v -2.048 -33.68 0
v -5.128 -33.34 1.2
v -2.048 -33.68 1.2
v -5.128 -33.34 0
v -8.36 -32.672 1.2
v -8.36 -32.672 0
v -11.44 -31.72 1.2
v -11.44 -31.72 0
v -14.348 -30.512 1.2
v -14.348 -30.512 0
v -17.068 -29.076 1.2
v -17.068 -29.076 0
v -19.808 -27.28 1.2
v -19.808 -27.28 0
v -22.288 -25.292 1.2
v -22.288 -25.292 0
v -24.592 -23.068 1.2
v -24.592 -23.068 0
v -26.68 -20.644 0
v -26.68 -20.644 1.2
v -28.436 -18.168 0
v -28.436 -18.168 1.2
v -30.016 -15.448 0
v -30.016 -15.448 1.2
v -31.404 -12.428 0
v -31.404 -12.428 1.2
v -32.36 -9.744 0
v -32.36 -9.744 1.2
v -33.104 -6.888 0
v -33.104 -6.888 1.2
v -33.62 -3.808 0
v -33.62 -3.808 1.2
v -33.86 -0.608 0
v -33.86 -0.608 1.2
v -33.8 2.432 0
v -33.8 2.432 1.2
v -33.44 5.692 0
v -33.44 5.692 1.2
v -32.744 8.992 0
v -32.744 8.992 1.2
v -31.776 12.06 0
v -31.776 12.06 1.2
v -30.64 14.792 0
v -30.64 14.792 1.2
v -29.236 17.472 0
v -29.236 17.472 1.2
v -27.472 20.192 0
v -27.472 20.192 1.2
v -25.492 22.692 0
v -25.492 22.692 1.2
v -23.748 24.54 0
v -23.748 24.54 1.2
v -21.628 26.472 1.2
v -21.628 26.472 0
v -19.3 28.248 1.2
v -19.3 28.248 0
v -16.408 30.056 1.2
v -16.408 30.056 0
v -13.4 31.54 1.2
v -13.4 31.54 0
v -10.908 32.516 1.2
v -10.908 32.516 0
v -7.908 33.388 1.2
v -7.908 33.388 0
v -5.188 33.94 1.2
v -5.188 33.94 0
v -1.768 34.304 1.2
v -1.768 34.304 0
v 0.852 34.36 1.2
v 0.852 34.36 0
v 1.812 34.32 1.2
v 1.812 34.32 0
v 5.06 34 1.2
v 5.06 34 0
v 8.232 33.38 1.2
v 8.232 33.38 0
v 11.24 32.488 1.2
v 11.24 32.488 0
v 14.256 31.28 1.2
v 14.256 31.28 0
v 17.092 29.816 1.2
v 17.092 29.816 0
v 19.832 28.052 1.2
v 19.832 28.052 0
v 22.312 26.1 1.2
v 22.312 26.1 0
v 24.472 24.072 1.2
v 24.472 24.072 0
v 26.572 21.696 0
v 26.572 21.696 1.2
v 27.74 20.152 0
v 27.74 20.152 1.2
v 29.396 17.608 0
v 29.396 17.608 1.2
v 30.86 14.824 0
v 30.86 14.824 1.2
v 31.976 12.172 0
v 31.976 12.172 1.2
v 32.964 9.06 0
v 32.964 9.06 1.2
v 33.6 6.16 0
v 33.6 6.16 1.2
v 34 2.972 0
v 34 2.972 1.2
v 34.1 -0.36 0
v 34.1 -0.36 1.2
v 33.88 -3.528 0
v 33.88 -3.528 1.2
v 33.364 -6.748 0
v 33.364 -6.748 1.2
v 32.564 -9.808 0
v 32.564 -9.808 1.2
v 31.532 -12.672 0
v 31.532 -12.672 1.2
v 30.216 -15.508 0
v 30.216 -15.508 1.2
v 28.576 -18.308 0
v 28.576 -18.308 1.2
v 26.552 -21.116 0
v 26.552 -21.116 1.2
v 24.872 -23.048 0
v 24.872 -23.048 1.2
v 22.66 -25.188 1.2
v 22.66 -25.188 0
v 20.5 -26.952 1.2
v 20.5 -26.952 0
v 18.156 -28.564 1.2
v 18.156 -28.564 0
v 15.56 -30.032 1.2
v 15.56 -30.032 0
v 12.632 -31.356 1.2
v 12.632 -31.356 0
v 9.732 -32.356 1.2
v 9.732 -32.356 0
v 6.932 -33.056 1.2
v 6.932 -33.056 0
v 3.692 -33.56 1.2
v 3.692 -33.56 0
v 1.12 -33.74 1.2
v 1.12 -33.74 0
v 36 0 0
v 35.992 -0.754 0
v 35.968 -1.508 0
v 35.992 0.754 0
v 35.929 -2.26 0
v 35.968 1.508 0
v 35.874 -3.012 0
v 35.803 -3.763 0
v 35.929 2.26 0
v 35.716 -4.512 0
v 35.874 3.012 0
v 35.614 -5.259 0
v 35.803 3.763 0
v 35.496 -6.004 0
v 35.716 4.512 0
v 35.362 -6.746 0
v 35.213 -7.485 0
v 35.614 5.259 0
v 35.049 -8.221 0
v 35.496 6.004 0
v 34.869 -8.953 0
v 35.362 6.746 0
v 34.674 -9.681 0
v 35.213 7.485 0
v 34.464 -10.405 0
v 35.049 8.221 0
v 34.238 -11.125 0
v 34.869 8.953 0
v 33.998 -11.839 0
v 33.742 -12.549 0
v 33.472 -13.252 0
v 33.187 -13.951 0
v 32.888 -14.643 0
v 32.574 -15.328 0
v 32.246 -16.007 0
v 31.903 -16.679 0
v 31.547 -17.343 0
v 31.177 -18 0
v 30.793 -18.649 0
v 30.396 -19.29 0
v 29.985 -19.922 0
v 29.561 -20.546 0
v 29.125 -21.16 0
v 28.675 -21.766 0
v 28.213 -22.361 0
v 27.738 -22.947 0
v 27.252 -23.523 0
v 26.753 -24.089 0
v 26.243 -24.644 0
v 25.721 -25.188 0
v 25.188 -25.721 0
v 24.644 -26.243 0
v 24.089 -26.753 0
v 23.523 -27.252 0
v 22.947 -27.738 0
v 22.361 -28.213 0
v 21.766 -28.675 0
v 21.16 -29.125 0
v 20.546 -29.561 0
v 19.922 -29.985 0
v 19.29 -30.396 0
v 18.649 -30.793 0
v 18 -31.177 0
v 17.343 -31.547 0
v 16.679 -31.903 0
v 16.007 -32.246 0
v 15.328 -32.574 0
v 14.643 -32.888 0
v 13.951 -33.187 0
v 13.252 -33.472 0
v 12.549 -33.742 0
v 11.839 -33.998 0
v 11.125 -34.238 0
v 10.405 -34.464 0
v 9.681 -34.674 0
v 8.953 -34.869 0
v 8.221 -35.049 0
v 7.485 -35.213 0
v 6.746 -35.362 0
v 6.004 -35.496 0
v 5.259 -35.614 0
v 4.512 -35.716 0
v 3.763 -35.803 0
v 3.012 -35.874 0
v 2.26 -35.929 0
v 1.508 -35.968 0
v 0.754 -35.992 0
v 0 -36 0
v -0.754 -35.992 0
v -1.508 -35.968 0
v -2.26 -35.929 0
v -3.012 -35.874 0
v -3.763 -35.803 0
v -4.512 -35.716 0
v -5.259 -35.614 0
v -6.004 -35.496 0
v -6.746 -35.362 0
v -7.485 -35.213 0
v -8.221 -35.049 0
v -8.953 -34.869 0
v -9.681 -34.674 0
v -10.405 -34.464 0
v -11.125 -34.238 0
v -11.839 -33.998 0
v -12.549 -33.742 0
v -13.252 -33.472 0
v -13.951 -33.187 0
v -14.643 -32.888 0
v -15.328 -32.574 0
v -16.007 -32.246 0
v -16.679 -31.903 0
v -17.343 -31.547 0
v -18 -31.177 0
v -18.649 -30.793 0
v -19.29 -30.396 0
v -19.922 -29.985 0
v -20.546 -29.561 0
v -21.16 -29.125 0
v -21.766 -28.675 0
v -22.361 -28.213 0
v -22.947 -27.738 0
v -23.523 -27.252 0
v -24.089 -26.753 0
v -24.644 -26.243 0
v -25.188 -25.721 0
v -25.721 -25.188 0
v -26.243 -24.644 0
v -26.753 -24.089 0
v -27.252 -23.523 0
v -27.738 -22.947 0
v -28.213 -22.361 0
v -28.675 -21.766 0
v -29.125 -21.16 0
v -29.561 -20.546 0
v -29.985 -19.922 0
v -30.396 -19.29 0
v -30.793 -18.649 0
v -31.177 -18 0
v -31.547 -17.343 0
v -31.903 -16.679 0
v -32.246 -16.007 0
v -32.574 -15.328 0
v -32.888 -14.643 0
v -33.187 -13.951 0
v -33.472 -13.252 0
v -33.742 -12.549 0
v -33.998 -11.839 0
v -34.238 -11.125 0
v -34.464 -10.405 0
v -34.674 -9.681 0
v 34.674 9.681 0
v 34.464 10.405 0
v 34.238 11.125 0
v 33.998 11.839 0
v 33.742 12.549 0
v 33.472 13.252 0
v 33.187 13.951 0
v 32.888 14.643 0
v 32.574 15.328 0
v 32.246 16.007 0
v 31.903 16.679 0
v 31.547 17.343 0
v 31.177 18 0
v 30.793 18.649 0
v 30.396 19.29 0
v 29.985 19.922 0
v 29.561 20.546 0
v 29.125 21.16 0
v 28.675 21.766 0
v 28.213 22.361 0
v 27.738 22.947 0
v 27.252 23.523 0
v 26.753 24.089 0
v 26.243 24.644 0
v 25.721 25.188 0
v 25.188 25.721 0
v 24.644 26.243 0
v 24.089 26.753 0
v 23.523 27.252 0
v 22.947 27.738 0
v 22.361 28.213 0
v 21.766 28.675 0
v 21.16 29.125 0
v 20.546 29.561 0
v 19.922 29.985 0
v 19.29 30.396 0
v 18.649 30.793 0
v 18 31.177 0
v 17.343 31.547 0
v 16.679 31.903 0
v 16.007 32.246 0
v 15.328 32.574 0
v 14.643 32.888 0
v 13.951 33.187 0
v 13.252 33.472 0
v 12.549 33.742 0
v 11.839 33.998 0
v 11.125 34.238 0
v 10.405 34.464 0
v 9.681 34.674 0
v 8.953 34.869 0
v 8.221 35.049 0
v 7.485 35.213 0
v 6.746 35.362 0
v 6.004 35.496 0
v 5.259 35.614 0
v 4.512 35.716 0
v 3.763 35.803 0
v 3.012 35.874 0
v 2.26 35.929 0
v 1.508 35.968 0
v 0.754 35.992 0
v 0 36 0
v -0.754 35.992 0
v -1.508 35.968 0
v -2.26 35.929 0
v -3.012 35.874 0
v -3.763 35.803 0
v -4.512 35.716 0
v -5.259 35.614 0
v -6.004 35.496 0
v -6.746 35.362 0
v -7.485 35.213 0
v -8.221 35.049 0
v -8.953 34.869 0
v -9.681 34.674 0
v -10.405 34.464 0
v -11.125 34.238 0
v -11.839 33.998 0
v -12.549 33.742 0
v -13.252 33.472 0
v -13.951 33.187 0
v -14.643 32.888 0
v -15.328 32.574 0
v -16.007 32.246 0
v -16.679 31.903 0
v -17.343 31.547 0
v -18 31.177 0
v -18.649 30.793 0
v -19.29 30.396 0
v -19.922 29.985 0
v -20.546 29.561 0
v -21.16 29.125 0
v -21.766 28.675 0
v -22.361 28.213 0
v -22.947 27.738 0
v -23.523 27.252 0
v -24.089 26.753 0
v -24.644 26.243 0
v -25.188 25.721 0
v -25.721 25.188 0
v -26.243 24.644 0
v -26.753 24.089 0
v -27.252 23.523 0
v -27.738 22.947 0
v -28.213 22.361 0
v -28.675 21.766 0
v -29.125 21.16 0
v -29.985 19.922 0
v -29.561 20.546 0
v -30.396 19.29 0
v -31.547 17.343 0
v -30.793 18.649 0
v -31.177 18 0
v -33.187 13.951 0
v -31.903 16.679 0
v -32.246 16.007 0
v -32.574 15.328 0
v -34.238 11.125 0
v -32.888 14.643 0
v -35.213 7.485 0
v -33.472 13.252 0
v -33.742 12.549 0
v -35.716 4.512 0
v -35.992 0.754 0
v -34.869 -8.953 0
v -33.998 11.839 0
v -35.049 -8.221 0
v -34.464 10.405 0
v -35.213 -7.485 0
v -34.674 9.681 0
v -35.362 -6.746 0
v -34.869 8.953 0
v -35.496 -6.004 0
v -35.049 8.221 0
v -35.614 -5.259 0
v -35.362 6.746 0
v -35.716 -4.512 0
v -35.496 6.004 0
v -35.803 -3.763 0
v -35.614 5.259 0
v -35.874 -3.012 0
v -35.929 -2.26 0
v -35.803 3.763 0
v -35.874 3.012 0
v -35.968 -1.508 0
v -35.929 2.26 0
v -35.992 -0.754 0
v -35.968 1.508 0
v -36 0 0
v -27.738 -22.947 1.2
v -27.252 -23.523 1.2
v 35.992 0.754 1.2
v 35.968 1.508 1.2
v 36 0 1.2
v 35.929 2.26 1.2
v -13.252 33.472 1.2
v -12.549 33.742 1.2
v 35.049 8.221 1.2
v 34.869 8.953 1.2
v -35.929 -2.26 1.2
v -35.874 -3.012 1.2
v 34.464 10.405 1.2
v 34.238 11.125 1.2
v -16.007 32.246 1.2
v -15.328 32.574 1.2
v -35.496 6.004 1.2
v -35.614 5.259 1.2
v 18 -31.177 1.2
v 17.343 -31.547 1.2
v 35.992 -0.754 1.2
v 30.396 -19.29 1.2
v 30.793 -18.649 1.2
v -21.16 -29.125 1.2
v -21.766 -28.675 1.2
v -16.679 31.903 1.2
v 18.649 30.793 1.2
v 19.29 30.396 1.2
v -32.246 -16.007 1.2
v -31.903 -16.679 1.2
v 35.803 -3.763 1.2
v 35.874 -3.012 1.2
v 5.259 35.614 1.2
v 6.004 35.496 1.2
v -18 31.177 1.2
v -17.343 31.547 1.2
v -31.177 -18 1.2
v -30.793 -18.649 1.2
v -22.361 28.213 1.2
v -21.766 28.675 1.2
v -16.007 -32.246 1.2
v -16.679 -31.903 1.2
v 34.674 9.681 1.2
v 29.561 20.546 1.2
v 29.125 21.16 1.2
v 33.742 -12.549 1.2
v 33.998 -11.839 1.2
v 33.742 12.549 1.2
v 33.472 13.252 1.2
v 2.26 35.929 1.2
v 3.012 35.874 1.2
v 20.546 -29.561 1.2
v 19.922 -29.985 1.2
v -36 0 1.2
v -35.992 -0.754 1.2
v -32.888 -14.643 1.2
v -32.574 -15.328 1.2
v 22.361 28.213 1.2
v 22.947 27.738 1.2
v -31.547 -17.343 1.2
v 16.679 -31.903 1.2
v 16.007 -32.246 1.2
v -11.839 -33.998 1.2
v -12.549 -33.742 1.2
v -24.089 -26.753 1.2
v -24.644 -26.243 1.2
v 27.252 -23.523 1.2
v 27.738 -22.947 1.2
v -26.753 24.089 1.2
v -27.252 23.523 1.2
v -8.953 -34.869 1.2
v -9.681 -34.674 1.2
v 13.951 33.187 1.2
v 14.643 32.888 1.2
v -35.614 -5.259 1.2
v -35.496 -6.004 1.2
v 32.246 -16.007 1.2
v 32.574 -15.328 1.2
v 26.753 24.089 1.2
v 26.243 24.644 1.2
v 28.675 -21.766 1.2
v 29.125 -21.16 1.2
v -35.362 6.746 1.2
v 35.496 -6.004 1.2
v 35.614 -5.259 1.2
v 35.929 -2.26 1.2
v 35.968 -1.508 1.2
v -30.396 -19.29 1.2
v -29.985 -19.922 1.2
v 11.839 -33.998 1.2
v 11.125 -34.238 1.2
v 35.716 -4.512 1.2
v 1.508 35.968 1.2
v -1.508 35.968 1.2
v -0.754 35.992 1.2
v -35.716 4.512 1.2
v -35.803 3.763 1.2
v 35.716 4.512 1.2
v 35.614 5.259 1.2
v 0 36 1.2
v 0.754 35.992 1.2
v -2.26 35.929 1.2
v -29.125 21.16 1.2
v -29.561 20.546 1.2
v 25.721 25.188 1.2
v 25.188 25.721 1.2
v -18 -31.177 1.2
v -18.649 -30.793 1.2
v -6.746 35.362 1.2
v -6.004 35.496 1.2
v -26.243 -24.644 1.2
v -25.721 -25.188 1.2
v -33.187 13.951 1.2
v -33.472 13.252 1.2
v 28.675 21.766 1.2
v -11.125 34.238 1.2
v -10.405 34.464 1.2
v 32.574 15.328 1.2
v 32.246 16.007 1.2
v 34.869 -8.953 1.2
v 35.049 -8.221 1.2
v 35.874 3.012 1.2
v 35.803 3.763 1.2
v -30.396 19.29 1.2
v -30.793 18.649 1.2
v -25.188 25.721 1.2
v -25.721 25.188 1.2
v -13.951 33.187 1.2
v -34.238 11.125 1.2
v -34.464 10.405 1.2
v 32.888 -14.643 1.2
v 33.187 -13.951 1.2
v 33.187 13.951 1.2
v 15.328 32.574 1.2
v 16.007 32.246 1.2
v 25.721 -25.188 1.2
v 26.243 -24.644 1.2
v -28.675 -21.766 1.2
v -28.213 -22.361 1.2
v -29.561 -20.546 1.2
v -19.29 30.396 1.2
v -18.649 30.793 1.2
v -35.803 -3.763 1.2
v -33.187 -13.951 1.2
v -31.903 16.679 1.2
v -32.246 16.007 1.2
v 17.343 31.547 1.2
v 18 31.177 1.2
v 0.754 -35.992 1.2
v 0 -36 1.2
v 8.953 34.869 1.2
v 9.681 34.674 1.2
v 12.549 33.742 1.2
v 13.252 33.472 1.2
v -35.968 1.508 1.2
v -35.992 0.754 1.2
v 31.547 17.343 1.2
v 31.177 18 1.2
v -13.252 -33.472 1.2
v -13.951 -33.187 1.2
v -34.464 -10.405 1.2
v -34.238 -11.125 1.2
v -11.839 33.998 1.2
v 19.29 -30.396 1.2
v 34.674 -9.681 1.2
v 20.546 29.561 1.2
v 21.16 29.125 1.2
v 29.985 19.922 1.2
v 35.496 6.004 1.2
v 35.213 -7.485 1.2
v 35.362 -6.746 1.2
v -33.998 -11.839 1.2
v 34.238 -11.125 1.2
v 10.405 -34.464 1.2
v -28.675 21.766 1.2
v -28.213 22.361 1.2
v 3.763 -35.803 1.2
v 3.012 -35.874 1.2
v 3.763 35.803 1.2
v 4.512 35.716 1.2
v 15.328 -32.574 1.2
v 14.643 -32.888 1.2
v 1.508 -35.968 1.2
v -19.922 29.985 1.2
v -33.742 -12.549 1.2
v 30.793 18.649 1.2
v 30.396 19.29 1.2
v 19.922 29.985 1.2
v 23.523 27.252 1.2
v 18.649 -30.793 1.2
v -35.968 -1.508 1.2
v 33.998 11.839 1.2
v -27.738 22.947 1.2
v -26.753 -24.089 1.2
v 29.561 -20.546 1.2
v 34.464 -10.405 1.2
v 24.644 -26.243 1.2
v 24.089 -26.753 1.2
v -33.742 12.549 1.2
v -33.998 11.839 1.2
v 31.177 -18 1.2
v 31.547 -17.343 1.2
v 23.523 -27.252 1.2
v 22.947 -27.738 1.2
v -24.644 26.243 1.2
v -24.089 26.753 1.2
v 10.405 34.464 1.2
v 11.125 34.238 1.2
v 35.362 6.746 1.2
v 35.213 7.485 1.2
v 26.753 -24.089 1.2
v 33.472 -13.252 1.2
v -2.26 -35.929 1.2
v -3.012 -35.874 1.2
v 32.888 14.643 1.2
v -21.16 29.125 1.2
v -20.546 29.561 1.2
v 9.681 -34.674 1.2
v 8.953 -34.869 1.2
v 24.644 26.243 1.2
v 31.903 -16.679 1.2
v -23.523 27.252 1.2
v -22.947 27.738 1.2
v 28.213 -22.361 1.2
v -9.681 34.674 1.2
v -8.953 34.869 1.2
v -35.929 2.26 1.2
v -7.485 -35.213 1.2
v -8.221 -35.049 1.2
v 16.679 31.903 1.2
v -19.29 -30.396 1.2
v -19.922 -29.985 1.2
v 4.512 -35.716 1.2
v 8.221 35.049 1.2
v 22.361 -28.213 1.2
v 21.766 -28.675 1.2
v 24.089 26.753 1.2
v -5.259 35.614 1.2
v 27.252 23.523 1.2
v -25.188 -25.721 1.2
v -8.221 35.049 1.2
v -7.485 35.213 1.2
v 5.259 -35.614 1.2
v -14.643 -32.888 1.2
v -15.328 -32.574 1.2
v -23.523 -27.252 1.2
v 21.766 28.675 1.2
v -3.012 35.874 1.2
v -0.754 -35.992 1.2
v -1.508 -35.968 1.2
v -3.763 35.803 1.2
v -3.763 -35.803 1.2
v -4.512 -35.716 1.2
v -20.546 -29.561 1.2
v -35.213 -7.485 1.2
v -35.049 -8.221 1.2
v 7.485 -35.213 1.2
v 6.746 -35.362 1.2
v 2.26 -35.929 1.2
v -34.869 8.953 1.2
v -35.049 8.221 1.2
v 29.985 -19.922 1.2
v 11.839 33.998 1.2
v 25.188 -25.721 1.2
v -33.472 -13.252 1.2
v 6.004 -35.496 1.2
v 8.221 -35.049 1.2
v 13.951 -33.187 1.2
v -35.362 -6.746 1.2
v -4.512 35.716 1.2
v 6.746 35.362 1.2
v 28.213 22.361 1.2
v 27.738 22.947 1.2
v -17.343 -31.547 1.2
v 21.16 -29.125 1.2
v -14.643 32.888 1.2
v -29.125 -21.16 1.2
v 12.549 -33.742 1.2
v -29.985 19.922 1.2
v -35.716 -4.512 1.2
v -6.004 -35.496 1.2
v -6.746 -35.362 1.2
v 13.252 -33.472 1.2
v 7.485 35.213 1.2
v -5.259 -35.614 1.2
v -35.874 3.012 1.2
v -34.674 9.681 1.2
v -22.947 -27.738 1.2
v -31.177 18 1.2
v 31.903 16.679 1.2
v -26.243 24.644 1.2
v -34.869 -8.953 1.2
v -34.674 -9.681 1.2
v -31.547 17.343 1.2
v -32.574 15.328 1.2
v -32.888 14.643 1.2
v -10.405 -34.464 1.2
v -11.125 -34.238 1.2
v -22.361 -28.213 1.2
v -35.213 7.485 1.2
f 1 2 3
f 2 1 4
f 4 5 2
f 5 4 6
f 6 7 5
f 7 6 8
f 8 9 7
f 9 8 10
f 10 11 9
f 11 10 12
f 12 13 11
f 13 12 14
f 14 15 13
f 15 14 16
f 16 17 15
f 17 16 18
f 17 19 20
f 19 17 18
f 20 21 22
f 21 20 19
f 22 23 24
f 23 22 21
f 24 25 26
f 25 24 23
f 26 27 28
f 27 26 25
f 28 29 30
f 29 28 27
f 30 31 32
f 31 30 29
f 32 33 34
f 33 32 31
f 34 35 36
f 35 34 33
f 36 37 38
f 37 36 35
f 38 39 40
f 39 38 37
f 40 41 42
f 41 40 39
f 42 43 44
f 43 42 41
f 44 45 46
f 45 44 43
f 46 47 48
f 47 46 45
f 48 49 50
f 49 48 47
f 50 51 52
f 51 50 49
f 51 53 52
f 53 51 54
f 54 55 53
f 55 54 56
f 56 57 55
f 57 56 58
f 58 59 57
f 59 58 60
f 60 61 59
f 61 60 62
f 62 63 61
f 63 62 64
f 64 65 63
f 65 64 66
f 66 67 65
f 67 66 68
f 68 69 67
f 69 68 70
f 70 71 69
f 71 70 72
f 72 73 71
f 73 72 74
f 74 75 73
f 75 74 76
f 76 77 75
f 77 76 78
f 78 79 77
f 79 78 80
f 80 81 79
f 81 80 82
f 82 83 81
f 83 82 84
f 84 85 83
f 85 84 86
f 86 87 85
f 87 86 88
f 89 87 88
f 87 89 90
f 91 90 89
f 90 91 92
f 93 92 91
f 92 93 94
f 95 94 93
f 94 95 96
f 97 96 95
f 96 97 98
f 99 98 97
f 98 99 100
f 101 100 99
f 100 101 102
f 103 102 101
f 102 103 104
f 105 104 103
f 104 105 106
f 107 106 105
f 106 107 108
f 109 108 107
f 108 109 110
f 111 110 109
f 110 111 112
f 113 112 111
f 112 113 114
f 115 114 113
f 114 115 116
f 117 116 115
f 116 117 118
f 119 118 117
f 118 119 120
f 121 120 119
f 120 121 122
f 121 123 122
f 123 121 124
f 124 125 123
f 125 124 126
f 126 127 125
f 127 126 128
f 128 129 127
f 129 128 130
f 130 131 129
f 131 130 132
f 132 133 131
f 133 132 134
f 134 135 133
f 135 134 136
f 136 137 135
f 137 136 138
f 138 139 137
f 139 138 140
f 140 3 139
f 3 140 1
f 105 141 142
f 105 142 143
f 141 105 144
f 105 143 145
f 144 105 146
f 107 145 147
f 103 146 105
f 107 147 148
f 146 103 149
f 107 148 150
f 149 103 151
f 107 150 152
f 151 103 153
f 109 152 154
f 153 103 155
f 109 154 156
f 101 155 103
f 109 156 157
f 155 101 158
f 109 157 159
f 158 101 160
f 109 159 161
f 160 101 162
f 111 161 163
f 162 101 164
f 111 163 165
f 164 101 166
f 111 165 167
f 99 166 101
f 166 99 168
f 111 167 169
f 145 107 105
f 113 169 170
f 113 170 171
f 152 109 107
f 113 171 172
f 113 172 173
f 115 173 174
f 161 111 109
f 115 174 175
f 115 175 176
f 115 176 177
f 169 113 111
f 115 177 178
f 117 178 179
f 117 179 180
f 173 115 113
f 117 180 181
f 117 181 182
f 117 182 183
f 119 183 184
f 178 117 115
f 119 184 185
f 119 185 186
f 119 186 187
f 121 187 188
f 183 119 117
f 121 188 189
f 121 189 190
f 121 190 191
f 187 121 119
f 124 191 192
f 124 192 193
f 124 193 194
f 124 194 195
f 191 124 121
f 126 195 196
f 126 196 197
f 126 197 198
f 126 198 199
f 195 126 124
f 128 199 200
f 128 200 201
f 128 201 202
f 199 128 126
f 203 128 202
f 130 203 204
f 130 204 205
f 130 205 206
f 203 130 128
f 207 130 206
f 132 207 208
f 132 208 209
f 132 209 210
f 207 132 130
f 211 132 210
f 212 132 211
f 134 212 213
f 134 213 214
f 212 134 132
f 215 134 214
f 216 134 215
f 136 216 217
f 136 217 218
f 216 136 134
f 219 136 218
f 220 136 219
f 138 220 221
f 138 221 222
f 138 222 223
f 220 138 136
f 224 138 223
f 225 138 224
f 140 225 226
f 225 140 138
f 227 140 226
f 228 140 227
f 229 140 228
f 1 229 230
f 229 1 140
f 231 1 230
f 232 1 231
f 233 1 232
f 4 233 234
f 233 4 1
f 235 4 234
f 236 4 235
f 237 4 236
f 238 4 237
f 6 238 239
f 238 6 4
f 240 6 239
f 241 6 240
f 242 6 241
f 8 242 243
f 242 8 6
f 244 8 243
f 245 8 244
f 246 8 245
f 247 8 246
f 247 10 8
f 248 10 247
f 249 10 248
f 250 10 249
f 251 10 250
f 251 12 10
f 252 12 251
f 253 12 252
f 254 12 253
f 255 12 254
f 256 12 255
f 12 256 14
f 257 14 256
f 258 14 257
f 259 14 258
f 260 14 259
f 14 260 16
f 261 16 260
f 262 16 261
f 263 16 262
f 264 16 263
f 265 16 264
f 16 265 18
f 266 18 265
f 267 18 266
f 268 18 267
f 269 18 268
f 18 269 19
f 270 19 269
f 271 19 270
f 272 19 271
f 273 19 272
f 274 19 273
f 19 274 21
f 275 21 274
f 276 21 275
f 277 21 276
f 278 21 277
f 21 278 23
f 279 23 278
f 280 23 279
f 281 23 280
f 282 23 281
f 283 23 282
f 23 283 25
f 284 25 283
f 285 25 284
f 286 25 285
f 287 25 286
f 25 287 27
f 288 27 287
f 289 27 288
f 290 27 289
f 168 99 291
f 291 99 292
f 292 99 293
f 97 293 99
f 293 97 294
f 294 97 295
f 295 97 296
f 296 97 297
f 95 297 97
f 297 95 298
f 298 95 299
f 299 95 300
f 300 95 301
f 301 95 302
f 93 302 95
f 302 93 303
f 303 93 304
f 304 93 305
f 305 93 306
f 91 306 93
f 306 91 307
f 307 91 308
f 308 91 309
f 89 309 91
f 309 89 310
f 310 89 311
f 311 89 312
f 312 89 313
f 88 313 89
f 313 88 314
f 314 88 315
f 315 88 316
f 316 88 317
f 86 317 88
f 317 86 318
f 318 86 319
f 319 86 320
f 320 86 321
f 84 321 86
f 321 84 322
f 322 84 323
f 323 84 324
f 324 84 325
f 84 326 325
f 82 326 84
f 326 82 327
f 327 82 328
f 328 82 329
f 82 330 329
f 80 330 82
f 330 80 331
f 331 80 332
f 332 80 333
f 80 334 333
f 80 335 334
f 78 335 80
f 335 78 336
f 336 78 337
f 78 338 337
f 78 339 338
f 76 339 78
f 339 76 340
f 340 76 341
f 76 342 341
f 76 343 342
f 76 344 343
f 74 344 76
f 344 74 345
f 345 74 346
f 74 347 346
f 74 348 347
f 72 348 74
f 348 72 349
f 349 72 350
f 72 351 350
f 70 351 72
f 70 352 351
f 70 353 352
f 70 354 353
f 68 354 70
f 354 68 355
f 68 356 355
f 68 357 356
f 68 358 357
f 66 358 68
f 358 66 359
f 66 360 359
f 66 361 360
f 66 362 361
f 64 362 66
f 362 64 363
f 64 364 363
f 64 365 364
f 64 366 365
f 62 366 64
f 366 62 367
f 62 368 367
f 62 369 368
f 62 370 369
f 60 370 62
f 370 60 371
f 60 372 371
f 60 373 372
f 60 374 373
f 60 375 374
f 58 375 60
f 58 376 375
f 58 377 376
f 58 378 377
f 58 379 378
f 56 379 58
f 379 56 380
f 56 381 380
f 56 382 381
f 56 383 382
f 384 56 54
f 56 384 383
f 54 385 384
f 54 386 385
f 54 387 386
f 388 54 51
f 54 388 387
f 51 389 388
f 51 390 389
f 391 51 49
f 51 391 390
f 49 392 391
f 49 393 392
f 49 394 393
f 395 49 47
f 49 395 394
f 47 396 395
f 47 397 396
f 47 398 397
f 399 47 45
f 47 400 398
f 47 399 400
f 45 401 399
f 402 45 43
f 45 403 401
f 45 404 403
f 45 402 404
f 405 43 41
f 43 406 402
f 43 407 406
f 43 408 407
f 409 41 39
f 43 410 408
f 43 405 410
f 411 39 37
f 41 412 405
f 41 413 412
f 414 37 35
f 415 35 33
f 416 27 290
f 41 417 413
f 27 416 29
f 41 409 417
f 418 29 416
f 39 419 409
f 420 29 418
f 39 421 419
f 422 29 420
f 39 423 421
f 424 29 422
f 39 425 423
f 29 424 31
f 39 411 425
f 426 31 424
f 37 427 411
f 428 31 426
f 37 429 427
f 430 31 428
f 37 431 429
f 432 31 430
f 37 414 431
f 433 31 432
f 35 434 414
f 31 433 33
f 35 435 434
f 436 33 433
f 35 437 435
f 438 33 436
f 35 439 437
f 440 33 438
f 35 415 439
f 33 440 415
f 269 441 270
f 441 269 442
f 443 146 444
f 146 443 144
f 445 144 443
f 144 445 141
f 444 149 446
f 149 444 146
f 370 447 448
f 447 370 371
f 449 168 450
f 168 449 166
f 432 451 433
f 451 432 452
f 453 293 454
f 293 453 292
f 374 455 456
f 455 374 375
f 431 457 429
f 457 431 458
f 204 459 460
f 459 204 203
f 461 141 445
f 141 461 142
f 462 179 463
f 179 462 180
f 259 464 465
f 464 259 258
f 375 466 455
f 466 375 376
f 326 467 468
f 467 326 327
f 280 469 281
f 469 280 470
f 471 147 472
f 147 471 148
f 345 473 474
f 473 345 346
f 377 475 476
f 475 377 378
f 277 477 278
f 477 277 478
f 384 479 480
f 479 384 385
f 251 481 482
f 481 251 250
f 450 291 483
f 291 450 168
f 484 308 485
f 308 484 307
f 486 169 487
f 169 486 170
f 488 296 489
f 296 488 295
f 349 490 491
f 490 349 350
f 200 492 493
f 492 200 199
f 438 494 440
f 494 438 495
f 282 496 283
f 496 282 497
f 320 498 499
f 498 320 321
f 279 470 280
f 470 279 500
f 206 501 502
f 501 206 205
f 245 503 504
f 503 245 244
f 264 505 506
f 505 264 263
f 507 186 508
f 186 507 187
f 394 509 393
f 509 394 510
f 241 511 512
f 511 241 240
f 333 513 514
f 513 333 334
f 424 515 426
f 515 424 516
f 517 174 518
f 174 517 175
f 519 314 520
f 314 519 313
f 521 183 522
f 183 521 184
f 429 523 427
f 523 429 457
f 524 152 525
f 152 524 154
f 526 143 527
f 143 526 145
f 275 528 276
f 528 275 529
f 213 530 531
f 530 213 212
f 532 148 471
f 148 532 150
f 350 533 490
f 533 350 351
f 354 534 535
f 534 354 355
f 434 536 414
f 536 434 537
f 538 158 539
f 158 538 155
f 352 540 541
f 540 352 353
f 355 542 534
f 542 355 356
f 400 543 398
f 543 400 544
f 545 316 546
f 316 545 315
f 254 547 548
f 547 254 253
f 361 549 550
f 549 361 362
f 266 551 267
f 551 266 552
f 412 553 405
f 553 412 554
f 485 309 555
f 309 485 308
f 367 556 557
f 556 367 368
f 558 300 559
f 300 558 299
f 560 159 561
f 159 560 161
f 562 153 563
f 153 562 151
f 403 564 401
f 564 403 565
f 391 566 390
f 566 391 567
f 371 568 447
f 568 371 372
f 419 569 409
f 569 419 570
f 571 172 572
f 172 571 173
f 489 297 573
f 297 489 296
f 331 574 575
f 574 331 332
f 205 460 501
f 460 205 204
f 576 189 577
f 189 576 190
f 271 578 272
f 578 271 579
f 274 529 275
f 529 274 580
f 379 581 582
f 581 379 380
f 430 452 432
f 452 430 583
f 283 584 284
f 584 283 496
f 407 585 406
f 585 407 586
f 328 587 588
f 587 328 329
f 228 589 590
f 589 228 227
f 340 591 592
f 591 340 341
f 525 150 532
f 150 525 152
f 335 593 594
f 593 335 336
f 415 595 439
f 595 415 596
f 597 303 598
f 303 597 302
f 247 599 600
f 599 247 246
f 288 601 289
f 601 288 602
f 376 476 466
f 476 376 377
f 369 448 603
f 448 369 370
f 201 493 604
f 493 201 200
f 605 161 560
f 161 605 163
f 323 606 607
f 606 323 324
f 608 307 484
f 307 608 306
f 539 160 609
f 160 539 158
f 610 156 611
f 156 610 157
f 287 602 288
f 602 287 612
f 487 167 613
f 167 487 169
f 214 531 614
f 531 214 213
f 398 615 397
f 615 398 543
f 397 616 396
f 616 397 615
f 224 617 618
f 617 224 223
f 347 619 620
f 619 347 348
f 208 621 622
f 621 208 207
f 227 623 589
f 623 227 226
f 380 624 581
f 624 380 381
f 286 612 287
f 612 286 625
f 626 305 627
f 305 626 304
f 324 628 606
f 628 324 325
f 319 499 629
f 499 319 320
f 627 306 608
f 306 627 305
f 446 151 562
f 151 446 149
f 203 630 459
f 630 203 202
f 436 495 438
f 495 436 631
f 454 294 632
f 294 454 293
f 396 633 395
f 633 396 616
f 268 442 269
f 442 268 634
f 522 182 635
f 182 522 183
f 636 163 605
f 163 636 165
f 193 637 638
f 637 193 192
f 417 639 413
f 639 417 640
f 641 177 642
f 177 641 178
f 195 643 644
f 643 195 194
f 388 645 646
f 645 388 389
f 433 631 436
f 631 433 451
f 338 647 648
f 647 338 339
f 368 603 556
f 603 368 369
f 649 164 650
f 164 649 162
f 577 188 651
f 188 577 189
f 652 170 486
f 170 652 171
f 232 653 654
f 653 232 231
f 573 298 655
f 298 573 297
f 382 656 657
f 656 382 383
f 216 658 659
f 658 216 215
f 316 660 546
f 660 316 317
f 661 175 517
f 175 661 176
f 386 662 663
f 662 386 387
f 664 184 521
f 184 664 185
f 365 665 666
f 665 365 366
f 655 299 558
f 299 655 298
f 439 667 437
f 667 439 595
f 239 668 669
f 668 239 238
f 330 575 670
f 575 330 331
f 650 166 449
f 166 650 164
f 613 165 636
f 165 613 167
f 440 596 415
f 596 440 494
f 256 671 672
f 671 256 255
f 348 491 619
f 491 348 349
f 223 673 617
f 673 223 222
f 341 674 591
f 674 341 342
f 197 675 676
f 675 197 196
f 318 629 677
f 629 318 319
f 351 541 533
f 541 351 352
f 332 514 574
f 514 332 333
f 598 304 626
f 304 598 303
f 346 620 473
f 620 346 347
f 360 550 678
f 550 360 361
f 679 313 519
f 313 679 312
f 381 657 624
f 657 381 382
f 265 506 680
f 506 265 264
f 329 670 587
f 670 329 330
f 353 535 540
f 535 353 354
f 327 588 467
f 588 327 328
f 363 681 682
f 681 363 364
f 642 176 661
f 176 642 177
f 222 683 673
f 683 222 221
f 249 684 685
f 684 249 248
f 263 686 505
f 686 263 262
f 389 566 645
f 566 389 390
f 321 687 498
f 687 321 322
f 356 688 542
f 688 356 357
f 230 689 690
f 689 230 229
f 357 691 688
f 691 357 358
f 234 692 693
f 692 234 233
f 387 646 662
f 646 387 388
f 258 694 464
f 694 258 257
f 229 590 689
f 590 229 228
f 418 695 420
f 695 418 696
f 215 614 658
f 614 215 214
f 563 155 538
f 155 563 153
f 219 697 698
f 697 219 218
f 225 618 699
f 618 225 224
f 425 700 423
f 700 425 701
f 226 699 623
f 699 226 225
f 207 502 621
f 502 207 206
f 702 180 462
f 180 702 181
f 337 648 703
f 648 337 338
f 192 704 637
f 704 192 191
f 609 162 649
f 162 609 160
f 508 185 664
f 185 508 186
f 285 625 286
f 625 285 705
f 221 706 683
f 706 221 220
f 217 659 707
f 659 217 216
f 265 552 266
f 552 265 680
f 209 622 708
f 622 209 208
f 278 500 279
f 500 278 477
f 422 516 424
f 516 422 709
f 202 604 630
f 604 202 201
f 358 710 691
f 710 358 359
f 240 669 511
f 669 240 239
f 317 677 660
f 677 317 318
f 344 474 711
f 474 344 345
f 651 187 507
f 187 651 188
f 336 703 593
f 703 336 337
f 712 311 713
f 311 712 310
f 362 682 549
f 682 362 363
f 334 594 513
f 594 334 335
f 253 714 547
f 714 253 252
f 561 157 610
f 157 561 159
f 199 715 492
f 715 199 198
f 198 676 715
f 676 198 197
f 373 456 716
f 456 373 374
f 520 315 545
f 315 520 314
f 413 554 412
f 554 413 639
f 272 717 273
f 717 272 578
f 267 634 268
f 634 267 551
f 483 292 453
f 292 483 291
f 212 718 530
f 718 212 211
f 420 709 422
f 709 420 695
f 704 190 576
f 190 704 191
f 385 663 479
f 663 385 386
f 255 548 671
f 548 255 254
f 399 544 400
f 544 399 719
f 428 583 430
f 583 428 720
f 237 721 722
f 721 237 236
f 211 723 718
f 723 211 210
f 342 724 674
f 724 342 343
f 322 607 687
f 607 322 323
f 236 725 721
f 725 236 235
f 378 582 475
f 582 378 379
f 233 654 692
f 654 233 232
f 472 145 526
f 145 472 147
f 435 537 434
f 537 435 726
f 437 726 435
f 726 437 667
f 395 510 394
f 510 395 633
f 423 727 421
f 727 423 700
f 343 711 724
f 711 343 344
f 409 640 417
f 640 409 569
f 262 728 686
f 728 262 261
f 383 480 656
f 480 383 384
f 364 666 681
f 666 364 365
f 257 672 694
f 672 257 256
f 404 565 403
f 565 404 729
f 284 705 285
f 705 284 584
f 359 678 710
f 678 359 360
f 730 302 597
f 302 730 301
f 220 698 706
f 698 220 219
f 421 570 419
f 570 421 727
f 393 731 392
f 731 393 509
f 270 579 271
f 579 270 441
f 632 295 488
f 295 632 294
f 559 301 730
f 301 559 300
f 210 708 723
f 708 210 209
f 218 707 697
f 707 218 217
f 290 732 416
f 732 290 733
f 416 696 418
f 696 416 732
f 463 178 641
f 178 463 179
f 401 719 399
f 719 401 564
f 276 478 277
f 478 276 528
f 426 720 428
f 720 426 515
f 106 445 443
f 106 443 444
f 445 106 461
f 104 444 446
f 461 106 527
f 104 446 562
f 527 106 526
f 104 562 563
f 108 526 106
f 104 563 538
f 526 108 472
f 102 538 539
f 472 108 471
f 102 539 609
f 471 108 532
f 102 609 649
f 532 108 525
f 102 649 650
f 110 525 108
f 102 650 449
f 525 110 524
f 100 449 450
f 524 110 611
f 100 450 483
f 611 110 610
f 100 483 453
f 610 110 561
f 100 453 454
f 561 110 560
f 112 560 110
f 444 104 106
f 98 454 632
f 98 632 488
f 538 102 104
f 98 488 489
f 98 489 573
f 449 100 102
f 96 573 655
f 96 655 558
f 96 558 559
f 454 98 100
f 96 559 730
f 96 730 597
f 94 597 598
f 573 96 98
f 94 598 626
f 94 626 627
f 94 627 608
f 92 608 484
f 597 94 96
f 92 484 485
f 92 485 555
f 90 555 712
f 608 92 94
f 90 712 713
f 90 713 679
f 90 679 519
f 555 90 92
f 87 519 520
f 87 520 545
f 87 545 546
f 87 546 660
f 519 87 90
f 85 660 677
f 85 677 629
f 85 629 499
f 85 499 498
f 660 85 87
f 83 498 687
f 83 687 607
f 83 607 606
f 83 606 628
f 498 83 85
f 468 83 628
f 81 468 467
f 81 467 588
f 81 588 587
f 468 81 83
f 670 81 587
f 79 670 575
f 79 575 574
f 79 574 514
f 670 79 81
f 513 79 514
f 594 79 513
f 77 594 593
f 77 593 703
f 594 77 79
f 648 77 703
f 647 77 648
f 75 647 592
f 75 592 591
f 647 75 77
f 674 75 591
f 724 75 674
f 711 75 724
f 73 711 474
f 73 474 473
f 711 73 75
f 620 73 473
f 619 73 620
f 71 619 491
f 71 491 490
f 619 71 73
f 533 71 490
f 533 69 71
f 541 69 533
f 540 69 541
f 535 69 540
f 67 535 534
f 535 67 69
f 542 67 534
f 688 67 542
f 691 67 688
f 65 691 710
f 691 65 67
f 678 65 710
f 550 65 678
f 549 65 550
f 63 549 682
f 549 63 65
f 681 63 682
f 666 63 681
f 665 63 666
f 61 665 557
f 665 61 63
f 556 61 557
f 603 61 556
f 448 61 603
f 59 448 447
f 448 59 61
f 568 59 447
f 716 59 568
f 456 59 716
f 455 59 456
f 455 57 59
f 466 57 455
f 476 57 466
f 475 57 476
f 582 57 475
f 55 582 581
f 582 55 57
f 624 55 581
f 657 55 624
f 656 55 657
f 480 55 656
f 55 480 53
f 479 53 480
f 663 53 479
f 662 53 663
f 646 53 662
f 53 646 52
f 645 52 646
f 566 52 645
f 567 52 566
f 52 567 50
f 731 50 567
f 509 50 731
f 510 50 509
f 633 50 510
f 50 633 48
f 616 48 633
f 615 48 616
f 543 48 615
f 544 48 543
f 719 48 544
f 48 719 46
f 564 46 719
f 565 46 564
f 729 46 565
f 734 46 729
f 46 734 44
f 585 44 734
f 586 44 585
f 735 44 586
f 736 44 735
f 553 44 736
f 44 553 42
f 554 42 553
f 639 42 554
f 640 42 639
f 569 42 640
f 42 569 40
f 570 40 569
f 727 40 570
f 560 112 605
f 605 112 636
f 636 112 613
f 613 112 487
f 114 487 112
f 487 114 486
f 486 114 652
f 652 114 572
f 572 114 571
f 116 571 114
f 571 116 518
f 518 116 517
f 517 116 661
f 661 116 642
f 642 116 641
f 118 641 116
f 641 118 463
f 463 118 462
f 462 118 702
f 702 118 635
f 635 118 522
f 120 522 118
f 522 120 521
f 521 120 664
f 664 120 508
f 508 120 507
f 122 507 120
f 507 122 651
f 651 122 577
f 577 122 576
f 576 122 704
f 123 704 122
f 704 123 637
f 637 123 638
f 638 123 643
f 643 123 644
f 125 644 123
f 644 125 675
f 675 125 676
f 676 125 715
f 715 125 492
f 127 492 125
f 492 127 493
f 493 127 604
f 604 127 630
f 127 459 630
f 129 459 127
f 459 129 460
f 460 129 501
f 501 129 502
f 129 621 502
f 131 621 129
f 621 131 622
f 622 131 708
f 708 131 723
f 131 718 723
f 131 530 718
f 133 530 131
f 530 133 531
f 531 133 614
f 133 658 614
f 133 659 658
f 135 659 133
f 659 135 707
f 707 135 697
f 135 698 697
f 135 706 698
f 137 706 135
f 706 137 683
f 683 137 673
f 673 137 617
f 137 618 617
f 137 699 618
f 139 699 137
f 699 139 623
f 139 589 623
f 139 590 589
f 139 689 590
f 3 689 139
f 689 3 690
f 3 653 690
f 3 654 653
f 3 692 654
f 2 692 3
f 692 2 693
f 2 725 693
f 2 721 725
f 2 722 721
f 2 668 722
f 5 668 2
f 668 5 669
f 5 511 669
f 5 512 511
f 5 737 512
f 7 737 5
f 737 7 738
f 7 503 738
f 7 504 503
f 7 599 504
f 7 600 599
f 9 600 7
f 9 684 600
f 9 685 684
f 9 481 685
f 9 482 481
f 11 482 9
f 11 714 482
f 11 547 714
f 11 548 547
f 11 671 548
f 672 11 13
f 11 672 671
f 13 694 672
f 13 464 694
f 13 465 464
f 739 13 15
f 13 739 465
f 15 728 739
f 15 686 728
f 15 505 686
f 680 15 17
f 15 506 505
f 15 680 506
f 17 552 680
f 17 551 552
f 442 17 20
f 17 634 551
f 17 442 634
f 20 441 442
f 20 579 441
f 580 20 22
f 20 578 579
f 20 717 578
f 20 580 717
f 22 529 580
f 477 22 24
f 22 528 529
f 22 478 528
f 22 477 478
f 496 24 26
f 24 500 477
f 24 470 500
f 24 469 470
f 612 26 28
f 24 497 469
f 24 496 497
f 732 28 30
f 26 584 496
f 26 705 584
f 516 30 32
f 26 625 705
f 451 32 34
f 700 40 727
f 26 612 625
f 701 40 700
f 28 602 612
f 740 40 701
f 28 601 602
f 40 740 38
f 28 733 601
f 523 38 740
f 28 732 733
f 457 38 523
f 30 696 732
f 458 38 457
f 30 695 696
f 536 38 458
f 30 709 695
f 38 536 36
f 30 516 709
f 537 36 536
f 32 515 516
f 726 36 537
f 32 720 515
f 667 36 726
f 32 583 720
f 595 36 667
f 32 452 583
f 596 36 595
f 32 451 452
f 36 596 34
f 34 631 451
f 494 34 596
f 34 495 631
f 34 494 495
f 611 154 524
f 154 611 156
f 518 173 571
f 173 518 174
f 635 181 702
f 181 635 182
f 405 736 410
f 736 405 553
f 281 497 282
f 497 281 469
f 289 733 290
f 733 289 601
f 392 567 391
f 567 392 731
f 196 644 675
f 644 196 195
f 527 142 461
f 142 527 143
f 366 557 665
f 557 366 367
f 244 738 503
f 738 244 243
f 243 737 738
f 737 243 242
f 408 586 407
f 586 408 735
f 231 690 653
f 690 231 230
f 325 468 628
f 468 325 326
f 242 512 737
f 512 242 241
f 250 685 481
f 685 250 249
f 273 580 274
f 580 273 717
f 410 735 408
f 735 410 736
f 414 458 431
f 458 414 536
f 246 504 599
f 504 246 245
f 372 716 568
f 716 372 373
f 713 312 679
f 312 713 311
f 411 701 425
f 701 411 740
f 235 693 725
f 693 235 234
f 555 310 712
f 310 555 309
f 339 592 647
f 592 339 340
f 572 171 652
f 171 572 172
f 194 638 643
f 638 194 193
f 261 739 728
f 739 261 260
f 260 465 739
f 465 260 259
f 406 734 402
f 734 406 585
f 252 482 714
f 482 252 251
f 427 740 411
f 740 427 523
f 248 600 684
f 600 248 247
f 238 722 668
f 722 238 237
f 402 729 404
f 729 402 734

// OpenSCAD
// file: C3text2.scad
module C3text2_1()
{
 /* Generated by trace2scad version 20150415
    http://aggregate.org/MAKE/TRACE2SCAD/
    Optimized model has 130/1056 original points
 */
 color([0.5, 0.5, 0.5])
 assign(minx=0) /* polygon minx=0 */
 assign(miny=0) /* polygon miny=0 */
 assign(maxx=20000) /* polygon maxx=20000 */
 assign(maxy=19690) /* polygon maxy=19690 */
 assign(dx=maxx-minx)
 assign(dy=maxy-miny)
 assign(maxd=((dx>dy)?dx:dy))
 scale([1/maxd, 1/maxd, 1])
 translate([-minx-dx/2, -miny-dy/2, 0])
 linear_extrude(height=1, convexity=130)
 union() {
  union() {
   polygon([[1,18799],[3,17908],[221,17839],[472,17805],[701,17833],[908,17890],[1153,18025],[1430,18292],[1584,18588],[1629,18742],[1660,18993],[1623,19271],[1575,19428],[1438,19676],[1425,19690],[0,19690]], convexity=5);
   polygon([[18275,19684],[18275,19678],[18190,19480],[18139,19274],[18133,19174],[18133,19061],[18165,18838],[18210,18684],[18345,18443],[18390,18373],[18617,18160],[18878,18016],[19060,17965],[19152,17947],[19364,17930],[19474,17948],[19726,18011],[20000,18151],[20000,19690],[18275,19690]], convexity=7);
   polygon([[5470,15212],[5438,15210],[5033,15163],[4693,15054],[4425,14896],[4204,14688],[4084,14518],[3981,14288],[3910,13988],[3898,13553],[3956,13218],[4062,12953],[4234,12708],[4468,12501],[4765,12345],[5118,12251],[5533,12216],[5966,12255],[6328,12346],[6408,12373],[6405,13115],[6168,12978],[5913,12896],[5655,12875],[5440,12891],[5252,12952],[5118,13032],[4966,13202],[4875,13414],[4840,13641],[4850,13893],[4910,14121],[5012,14291],[5175,14436],[5378,14524],[5530,14555],[5828,14546],[6093,14477],[6338,14356],[6410,14321],[6410,15045],[6008,15164],[5625,15210],[5503,15213]], convexity=12);
   polygon([[13037,14948],[13034,14940],[13636,12665],[14427,12671],[14814,14231],[15206,12665],[15994,12671],[16589,14949],[15894,14948],[15498,13403],[15114,14955],[14509,14946],[14118,13388],[13734,14955],[13040,14955]], convexity=11);
   polygon([[19317,1895],[19313,1891],[19054,1852],[18793,1743],[18637,1640],[18420,1407],[18319,1238],[18230,1004],[18192,716],[18215,488],[18257,332],[18390,63],[18428,3],[20000,0],[20000,1719],[19773,1825],[19567,1880],[19322,1900]], convexity=6);
   polygon([[417,1770],[413,1766],[194,1738],[3,1672],[0,0],[1498,0],[1595,225],[1629,342],[1650,479],[1655,643],[1623,863],[1544,1085],[1415,1303],[1173,1545],[875,1700],[665,1755],[422,1775]], convexity=5);
  }
 }
}

module C3text2()
{
 /* all layers combined, scaled to within a 1mm cube */
 scale([1, 1, 1/1])
 difference() {
  union() {
   scale([1,1,2]) translate([0,0,-0.5]) C3text2_1();
  }
  translate([0,0,-2]) cube([2,2,4],center=true);
 }
}
C3text2();
// file: C3white.scad
module C3white_1()
{
 /* Generated by trace2scad version 20150415
    http://aggregate.org/MAKE/TRACE2SCAD/
    Optimized model has 217/2306 original points
 */
 color([0.5, 0.5, 0.5])
 assign(minx=0) /* polygon minx=0 */
 assign(miny=0) /* polygon miny=0 */
 assign(maxx=20000) /* polygon maxx=20000 */
 assign(maxy=19690) /* polygon maxy=19690 */
 assign(dx=maxx-minx)
 assign(dy=maxy-miny)
 assign(maxd=((dx>dy)?dx:dy))
 scale([1/maxd, 1/maxd, 1])
 translate([-minx-dx/2, -miny-dy/2, 0])
 linear_extrude(height=1, convexity=217)
 union() {
  union() {
   polygon([[1,18799],[3,17908],[221,17839],[472,17805],[701,17833],[908,17890],[1153,18025],[1430,18292],[1584,18588],[1629,18742],[1660,18993],[1623,19271],[1575,19428],[1438,19676],[1425,19690],[0,19690]], convexity=5);
   polygon([[18275,19684],[18275,19678],[18190,19480],[18139,19274],[18133,19174],[18133,19061],[18165,18838],[18210,18684],[18345,18443],[18390,18373],[18617,18160],[18878,18016],[19060,17965],[19152,17947],[19364,17930],[19474,17948],[19726,18011],[20000,18151],[20000,19690],[18275,19690]], convexity=7);
   union() {
    difference() {
     polygon([[9773,19182],[9718,19180],[8873,19120],[7988,18976],[7175,18765],[6498,18531],[5833,18244],[5096,17850],[4363,17369],[3699,16841],[3097,16268],[2607,15718],[2098,15036],[1666,14338],[1281,13563],[979,12783],[740,11942],[589,11128],[510,10283],[504,9644],[560,8823],[704,7938],[915,7135],[1174,6408],[1514,5663],[1945,4913],[2375,4295],[2908,3651],[3556,3003],[4169,2493],[4825,2033],[5523,1629],[6286,1270],[7128,965],[7968,745],[8790,607],[9468,546],[9981,529],[10883,575],[11771,700],[12613,899],[13443,1176],[14106,1460],[14877,1872],[15563,2320],[16203,2822],[16744,3324],[17328,3964],[17799,4583],[18245,5288],[18623,6023],[18921,6753],[19154,7498],[19328,8298],[19430,9088],[19466,9859],[19420,10743],[19299,11583],[19115,12358],[18863,13123],[18575,13801],[18159,14578],[17698,15275],[17248,15848],[16943,16192],[16371,16747],[15728,17275],[15083,17719],[14408,18105],[13608,18475],[12805,18760],[11998,18971],[11133,19115],[10288,19180],[9828,19184]], convexity=6);
     polygon([[10333,18430],[10453,18425],[11265,18345],[12058,18190],[12810,17967],[13564,17665],[14273,17299],[14958,16858],[15578,16370],[16118,15863],[16643,15269],[16935,14883],[17349,14247],[17715,13551],[17994,12888],[18241,12110],[18400,11385],[18500,10588],[18525,9755],[18470,8963],[18341,8158],[18141,7393],[17883,6677],[17554,5968],[17144,5268],[16638,4566],[16218,4083],[15665,3548],[15125,3107],[14539,2704],[13890,2337],[13158,2006],[12433,1756],[11733,1581],[10923,1455],[10280,1410],[9488,1425],[8718,1510],[7910,1677],[7140,1915],[6413,2217],[5733,2576],[5048,3025],[4428,3522],[3852,4078],[3330,4684],[2891,5303],[2496,5983],[2149,6738],[1910,7409],[1724,8123],[1595,8893],[1535,9693],[1550,10453],[1640,11268],[1814,12093],[2056,12860],[2340,13543],[2691,14213],[3132,14893],[3627,15518],[4063,15980],[4593,16463],[5175,16907],[5898,17359],[6650,17730],[7273,17974],[8023,18192],[8703,18330],[9558,18421],[10213,18435]], convexity=6);
    }
   }
   polygon([[19317,1895],[19313,1891],[19054,1852],[18793,1743],[18637,1640],[18420,1407],[18319,1238],[18230,1004],[18192,716],[18215,488],[18257,332],[18390,63],[18428,3],[20000,0],[20000,1719],[19773,1825],[19567,1880],[19322,1900]], convexity=6);
   polygon([[417,1770],[413,1766],[194,1738],[3,1672],[0,0],[1498,0],[1595,225],[1629,342],[1650,479],[1655,643],[1623,863],[1544,1085],[1415,1303],[1173,1545],[875,1700],[665,1755],[422,1775]], convexity=5);
  }
 }
}

module C3white()
{
 /* all layers combined, scaled to within a 1mm cube */
 scale([1, 1, 1/1])
 difference() {
  union() {
   scale([1,1,2]) translate([0,0,-0.5]) C3white_1();
  }
  translate([0,0,-2]) cube([2,2,4],center=true);
 }
}
C3white();
// file: C3purple.scad
module C3purple_1()
{
 /* Generated by trace2scad version 20150415
    http://aggregate.org/MAKE/TRACE2SCAD/
    Optimized model has 227/2747 original points
 */
 color([0.5, 0.5, 0.5])
 assign(minx=0) /* polygon minx=0 */
 assign(miny=0) /* polygon miny=0 */
 assign(maxx=20000) /* polygon maxx=20000 */
 assign(maxy=19690) /* polygon maxy=19690 */
 assign(dx=maxx-minx)
 assign(dy=maxy-miny)
 assign(maxd=((dx>dy)?dx:dy))
 scale([1/maxd, 1/maxd, 1])
 translate([-minx-dx/2, -miny-dy/2, 0])
 linear_extrude(height=1, convexity=227)
 union() {
  union() {
   polygon([[1,18799],[3,17908],[221,17839],[472,17805],[701,17833],[908,17890],[1153,18025],[1430,18292],[1584,18588],[1629,18742],[1660,18993],[1623,19271],[1575,19428],[1438,19676],[1425,19690],[0,19690]], convexity=5);
   polygon([[18275,19684],[18275,19678],[18190,19480],[18139,19274],[18133,19174],[18133,19061],[18165,18838],[18210,18684],[18345,18443],[18390,18373],[18617,18160],[18878,18016],[19060,17965],[19152,17947],[19364,17930],[19474,17948],[19726,18011],[20000,18151],[20000,19690],[18275,19690]], convexity=7);
   polygon([[10878,13810],[10874,13805],[10754,13790],[10688,13724],[10665,13651],[10706,13582],[10984,13460],[11055,13381],[11055,13191],[10875,13115],[10772,13081],[10598,13020],[10425,12955],[10225,12905],[10028,12845],[9869,12815],[9543,12725],[9108,12629],[8585,12503],[8109,12302],[7999,12212],[7918,12055],[7894,11842],[7994,11586],[8161,11413],[8414,11302],[8683,11205],[9313,11025],[9648,10936],[10172,10825],[10878,10591],[11115,10435],[11155,10354],[11145,10227],[11094,10156],[10873,10044],[10456,9979],[10328,9960],[10085,9920],[9515,9830],[9468,9820],[8834,9729],[8328,9640],[7497,9459],[7005,9337],[6313,9141],[6063,9037],[5950,8997],[5608,8818],[5474,8723],[5342,8588],[5200,8317],[5160,8105],[5167,7810],[5268,7358],[5330,7213],[5448,7018],[5523,6910],[5595,6805],[5669,6682],[5816,6495],[5966,6218],[6060,6018],[6086,5815],[6058,5605],[5968,5412],[5803,5217],[5378,4995],[4759,4795],[4336,4692],[4304,4680],[4019,4631],[3571,4557],[3455,4533],[4046,3875],[4620,3360],[5253,2884],[5915,2476],[6690,2095],[7408,1827],[8188,1612],[8988,1475],[9708,1415],[10408,1419],[10963,1710],[11238,1860],[11806,2203],[12313,2640],[12590,2926],[12807,3263],[12870,3488],[12916,3708],[12881,4243],[12816,4528],[12666,4923],[12553,5169],[12271,5578],[11997,5828],[11553,6155],[11253,6415],[10998,6613],[10826,6748],[10695,6893],[10532,7031],[10383,7183],[10118,7475],[10050,7623],[10004,7758],[10002,8034],[10075,8225],[10215,8395],[10408,8539],[10708,8690],[10987,8795],[11869,9026],[12087,9080],[12453,9147],[13019,9252],[13658,9400],[14073,9492],[14592,9623],[14971,9802],[15065,10041],[14922,10280],[14592,10500],[14028,10706],[13789,10759],[13260,10883],[12343,11093],[11863,11200],[11170,11352],[10748,11450],[10269,11621],[10055,11759],[9984,11852],[9985,11981],[10026,12060],[10202,12198],[10362,12289],[10666,12425],[11263,12602],[11754,12775],[12158,12961],[12298,13075],[12345,13207],[12301,13298],[12150,13423],[12049,13514],[11960,13567],[11889,13620],[11690,13710],[11591,13720],[11422,13770],[11385,13778],[11247,13815],[10881,13815]], convexity=16);
   polygon([[19317,1895],[19313,1891],[19054,1852],[18793,1743],[18637,1640],[18420,1407],[18319,1238],[18230,1004],[18192,716],[18215,488],[18257,332],[18390,63],[18428,3],[20000,0],[20000,1719],[19773,1825],[19567,1880],[19322,1900]], convexity=6);
   polygon([[417,1770],[413,1766],[194,1738],[3,1672],[0,0],[1498,0],[1595,225],[1629,342],[1650,479],[1655,643],[1623,863],[1544,1085],[1415,1303],[1173,1545],[875,1700],[665,1755],[422,1775]], convexity=5);
  }
 }
}

module C3purple()
{
 /* all layers combined, scaled to within a 1mm cube */
 scale([1, 1, 1/1])
 difference() {
  union() {
   scale([1,1,2]) translate([0,0,-0.5]) C3purple_1();
  }
  translate([0,0,-2]) cube([2,2,4],center=true);
 }
}
C3purple();
// main file
// CrickWooder.scad
//
//------------------------------------------------


use <./C3purple.scad>
use <./C3white.scad>
use <./C3text.scad>
use <./C3text2.scad>

//=====================================================

if(1){
intersection(){
  cylinder(r=36,h=1.2,$fn=300);

  scale([80,80,1.2]){
    
    //color("white")
    C3white();
    //color("purple")
    //C3purple();
    //color("white")
    //C3text();
    //C3text2();

    }
  }
}

// get black by subtraction so no voids between parts
if(0){
  color("black")
difference(){
  cylinder(r=37,h=1.2,$fn=300);

  translate([0,0,-1])
  scale([80,80,4]){
  
  C3purple();
  C3white();
  C3text();
//  C3text2();
  
  }
  
}
}

// clear disk bottom
if(0){
  color("cyan",alpha=0.4)
  translate([0,0,-0.3])  
  cylinder(r=36,h=0.3,$fn=300);
}

// clear top bottom
if(0){
  color("cyan",alpha=0.4)
  translate([0,0,1.2])  
  cylinder(r=36,h=0.3,$fn=300);
}


//=====================================================
